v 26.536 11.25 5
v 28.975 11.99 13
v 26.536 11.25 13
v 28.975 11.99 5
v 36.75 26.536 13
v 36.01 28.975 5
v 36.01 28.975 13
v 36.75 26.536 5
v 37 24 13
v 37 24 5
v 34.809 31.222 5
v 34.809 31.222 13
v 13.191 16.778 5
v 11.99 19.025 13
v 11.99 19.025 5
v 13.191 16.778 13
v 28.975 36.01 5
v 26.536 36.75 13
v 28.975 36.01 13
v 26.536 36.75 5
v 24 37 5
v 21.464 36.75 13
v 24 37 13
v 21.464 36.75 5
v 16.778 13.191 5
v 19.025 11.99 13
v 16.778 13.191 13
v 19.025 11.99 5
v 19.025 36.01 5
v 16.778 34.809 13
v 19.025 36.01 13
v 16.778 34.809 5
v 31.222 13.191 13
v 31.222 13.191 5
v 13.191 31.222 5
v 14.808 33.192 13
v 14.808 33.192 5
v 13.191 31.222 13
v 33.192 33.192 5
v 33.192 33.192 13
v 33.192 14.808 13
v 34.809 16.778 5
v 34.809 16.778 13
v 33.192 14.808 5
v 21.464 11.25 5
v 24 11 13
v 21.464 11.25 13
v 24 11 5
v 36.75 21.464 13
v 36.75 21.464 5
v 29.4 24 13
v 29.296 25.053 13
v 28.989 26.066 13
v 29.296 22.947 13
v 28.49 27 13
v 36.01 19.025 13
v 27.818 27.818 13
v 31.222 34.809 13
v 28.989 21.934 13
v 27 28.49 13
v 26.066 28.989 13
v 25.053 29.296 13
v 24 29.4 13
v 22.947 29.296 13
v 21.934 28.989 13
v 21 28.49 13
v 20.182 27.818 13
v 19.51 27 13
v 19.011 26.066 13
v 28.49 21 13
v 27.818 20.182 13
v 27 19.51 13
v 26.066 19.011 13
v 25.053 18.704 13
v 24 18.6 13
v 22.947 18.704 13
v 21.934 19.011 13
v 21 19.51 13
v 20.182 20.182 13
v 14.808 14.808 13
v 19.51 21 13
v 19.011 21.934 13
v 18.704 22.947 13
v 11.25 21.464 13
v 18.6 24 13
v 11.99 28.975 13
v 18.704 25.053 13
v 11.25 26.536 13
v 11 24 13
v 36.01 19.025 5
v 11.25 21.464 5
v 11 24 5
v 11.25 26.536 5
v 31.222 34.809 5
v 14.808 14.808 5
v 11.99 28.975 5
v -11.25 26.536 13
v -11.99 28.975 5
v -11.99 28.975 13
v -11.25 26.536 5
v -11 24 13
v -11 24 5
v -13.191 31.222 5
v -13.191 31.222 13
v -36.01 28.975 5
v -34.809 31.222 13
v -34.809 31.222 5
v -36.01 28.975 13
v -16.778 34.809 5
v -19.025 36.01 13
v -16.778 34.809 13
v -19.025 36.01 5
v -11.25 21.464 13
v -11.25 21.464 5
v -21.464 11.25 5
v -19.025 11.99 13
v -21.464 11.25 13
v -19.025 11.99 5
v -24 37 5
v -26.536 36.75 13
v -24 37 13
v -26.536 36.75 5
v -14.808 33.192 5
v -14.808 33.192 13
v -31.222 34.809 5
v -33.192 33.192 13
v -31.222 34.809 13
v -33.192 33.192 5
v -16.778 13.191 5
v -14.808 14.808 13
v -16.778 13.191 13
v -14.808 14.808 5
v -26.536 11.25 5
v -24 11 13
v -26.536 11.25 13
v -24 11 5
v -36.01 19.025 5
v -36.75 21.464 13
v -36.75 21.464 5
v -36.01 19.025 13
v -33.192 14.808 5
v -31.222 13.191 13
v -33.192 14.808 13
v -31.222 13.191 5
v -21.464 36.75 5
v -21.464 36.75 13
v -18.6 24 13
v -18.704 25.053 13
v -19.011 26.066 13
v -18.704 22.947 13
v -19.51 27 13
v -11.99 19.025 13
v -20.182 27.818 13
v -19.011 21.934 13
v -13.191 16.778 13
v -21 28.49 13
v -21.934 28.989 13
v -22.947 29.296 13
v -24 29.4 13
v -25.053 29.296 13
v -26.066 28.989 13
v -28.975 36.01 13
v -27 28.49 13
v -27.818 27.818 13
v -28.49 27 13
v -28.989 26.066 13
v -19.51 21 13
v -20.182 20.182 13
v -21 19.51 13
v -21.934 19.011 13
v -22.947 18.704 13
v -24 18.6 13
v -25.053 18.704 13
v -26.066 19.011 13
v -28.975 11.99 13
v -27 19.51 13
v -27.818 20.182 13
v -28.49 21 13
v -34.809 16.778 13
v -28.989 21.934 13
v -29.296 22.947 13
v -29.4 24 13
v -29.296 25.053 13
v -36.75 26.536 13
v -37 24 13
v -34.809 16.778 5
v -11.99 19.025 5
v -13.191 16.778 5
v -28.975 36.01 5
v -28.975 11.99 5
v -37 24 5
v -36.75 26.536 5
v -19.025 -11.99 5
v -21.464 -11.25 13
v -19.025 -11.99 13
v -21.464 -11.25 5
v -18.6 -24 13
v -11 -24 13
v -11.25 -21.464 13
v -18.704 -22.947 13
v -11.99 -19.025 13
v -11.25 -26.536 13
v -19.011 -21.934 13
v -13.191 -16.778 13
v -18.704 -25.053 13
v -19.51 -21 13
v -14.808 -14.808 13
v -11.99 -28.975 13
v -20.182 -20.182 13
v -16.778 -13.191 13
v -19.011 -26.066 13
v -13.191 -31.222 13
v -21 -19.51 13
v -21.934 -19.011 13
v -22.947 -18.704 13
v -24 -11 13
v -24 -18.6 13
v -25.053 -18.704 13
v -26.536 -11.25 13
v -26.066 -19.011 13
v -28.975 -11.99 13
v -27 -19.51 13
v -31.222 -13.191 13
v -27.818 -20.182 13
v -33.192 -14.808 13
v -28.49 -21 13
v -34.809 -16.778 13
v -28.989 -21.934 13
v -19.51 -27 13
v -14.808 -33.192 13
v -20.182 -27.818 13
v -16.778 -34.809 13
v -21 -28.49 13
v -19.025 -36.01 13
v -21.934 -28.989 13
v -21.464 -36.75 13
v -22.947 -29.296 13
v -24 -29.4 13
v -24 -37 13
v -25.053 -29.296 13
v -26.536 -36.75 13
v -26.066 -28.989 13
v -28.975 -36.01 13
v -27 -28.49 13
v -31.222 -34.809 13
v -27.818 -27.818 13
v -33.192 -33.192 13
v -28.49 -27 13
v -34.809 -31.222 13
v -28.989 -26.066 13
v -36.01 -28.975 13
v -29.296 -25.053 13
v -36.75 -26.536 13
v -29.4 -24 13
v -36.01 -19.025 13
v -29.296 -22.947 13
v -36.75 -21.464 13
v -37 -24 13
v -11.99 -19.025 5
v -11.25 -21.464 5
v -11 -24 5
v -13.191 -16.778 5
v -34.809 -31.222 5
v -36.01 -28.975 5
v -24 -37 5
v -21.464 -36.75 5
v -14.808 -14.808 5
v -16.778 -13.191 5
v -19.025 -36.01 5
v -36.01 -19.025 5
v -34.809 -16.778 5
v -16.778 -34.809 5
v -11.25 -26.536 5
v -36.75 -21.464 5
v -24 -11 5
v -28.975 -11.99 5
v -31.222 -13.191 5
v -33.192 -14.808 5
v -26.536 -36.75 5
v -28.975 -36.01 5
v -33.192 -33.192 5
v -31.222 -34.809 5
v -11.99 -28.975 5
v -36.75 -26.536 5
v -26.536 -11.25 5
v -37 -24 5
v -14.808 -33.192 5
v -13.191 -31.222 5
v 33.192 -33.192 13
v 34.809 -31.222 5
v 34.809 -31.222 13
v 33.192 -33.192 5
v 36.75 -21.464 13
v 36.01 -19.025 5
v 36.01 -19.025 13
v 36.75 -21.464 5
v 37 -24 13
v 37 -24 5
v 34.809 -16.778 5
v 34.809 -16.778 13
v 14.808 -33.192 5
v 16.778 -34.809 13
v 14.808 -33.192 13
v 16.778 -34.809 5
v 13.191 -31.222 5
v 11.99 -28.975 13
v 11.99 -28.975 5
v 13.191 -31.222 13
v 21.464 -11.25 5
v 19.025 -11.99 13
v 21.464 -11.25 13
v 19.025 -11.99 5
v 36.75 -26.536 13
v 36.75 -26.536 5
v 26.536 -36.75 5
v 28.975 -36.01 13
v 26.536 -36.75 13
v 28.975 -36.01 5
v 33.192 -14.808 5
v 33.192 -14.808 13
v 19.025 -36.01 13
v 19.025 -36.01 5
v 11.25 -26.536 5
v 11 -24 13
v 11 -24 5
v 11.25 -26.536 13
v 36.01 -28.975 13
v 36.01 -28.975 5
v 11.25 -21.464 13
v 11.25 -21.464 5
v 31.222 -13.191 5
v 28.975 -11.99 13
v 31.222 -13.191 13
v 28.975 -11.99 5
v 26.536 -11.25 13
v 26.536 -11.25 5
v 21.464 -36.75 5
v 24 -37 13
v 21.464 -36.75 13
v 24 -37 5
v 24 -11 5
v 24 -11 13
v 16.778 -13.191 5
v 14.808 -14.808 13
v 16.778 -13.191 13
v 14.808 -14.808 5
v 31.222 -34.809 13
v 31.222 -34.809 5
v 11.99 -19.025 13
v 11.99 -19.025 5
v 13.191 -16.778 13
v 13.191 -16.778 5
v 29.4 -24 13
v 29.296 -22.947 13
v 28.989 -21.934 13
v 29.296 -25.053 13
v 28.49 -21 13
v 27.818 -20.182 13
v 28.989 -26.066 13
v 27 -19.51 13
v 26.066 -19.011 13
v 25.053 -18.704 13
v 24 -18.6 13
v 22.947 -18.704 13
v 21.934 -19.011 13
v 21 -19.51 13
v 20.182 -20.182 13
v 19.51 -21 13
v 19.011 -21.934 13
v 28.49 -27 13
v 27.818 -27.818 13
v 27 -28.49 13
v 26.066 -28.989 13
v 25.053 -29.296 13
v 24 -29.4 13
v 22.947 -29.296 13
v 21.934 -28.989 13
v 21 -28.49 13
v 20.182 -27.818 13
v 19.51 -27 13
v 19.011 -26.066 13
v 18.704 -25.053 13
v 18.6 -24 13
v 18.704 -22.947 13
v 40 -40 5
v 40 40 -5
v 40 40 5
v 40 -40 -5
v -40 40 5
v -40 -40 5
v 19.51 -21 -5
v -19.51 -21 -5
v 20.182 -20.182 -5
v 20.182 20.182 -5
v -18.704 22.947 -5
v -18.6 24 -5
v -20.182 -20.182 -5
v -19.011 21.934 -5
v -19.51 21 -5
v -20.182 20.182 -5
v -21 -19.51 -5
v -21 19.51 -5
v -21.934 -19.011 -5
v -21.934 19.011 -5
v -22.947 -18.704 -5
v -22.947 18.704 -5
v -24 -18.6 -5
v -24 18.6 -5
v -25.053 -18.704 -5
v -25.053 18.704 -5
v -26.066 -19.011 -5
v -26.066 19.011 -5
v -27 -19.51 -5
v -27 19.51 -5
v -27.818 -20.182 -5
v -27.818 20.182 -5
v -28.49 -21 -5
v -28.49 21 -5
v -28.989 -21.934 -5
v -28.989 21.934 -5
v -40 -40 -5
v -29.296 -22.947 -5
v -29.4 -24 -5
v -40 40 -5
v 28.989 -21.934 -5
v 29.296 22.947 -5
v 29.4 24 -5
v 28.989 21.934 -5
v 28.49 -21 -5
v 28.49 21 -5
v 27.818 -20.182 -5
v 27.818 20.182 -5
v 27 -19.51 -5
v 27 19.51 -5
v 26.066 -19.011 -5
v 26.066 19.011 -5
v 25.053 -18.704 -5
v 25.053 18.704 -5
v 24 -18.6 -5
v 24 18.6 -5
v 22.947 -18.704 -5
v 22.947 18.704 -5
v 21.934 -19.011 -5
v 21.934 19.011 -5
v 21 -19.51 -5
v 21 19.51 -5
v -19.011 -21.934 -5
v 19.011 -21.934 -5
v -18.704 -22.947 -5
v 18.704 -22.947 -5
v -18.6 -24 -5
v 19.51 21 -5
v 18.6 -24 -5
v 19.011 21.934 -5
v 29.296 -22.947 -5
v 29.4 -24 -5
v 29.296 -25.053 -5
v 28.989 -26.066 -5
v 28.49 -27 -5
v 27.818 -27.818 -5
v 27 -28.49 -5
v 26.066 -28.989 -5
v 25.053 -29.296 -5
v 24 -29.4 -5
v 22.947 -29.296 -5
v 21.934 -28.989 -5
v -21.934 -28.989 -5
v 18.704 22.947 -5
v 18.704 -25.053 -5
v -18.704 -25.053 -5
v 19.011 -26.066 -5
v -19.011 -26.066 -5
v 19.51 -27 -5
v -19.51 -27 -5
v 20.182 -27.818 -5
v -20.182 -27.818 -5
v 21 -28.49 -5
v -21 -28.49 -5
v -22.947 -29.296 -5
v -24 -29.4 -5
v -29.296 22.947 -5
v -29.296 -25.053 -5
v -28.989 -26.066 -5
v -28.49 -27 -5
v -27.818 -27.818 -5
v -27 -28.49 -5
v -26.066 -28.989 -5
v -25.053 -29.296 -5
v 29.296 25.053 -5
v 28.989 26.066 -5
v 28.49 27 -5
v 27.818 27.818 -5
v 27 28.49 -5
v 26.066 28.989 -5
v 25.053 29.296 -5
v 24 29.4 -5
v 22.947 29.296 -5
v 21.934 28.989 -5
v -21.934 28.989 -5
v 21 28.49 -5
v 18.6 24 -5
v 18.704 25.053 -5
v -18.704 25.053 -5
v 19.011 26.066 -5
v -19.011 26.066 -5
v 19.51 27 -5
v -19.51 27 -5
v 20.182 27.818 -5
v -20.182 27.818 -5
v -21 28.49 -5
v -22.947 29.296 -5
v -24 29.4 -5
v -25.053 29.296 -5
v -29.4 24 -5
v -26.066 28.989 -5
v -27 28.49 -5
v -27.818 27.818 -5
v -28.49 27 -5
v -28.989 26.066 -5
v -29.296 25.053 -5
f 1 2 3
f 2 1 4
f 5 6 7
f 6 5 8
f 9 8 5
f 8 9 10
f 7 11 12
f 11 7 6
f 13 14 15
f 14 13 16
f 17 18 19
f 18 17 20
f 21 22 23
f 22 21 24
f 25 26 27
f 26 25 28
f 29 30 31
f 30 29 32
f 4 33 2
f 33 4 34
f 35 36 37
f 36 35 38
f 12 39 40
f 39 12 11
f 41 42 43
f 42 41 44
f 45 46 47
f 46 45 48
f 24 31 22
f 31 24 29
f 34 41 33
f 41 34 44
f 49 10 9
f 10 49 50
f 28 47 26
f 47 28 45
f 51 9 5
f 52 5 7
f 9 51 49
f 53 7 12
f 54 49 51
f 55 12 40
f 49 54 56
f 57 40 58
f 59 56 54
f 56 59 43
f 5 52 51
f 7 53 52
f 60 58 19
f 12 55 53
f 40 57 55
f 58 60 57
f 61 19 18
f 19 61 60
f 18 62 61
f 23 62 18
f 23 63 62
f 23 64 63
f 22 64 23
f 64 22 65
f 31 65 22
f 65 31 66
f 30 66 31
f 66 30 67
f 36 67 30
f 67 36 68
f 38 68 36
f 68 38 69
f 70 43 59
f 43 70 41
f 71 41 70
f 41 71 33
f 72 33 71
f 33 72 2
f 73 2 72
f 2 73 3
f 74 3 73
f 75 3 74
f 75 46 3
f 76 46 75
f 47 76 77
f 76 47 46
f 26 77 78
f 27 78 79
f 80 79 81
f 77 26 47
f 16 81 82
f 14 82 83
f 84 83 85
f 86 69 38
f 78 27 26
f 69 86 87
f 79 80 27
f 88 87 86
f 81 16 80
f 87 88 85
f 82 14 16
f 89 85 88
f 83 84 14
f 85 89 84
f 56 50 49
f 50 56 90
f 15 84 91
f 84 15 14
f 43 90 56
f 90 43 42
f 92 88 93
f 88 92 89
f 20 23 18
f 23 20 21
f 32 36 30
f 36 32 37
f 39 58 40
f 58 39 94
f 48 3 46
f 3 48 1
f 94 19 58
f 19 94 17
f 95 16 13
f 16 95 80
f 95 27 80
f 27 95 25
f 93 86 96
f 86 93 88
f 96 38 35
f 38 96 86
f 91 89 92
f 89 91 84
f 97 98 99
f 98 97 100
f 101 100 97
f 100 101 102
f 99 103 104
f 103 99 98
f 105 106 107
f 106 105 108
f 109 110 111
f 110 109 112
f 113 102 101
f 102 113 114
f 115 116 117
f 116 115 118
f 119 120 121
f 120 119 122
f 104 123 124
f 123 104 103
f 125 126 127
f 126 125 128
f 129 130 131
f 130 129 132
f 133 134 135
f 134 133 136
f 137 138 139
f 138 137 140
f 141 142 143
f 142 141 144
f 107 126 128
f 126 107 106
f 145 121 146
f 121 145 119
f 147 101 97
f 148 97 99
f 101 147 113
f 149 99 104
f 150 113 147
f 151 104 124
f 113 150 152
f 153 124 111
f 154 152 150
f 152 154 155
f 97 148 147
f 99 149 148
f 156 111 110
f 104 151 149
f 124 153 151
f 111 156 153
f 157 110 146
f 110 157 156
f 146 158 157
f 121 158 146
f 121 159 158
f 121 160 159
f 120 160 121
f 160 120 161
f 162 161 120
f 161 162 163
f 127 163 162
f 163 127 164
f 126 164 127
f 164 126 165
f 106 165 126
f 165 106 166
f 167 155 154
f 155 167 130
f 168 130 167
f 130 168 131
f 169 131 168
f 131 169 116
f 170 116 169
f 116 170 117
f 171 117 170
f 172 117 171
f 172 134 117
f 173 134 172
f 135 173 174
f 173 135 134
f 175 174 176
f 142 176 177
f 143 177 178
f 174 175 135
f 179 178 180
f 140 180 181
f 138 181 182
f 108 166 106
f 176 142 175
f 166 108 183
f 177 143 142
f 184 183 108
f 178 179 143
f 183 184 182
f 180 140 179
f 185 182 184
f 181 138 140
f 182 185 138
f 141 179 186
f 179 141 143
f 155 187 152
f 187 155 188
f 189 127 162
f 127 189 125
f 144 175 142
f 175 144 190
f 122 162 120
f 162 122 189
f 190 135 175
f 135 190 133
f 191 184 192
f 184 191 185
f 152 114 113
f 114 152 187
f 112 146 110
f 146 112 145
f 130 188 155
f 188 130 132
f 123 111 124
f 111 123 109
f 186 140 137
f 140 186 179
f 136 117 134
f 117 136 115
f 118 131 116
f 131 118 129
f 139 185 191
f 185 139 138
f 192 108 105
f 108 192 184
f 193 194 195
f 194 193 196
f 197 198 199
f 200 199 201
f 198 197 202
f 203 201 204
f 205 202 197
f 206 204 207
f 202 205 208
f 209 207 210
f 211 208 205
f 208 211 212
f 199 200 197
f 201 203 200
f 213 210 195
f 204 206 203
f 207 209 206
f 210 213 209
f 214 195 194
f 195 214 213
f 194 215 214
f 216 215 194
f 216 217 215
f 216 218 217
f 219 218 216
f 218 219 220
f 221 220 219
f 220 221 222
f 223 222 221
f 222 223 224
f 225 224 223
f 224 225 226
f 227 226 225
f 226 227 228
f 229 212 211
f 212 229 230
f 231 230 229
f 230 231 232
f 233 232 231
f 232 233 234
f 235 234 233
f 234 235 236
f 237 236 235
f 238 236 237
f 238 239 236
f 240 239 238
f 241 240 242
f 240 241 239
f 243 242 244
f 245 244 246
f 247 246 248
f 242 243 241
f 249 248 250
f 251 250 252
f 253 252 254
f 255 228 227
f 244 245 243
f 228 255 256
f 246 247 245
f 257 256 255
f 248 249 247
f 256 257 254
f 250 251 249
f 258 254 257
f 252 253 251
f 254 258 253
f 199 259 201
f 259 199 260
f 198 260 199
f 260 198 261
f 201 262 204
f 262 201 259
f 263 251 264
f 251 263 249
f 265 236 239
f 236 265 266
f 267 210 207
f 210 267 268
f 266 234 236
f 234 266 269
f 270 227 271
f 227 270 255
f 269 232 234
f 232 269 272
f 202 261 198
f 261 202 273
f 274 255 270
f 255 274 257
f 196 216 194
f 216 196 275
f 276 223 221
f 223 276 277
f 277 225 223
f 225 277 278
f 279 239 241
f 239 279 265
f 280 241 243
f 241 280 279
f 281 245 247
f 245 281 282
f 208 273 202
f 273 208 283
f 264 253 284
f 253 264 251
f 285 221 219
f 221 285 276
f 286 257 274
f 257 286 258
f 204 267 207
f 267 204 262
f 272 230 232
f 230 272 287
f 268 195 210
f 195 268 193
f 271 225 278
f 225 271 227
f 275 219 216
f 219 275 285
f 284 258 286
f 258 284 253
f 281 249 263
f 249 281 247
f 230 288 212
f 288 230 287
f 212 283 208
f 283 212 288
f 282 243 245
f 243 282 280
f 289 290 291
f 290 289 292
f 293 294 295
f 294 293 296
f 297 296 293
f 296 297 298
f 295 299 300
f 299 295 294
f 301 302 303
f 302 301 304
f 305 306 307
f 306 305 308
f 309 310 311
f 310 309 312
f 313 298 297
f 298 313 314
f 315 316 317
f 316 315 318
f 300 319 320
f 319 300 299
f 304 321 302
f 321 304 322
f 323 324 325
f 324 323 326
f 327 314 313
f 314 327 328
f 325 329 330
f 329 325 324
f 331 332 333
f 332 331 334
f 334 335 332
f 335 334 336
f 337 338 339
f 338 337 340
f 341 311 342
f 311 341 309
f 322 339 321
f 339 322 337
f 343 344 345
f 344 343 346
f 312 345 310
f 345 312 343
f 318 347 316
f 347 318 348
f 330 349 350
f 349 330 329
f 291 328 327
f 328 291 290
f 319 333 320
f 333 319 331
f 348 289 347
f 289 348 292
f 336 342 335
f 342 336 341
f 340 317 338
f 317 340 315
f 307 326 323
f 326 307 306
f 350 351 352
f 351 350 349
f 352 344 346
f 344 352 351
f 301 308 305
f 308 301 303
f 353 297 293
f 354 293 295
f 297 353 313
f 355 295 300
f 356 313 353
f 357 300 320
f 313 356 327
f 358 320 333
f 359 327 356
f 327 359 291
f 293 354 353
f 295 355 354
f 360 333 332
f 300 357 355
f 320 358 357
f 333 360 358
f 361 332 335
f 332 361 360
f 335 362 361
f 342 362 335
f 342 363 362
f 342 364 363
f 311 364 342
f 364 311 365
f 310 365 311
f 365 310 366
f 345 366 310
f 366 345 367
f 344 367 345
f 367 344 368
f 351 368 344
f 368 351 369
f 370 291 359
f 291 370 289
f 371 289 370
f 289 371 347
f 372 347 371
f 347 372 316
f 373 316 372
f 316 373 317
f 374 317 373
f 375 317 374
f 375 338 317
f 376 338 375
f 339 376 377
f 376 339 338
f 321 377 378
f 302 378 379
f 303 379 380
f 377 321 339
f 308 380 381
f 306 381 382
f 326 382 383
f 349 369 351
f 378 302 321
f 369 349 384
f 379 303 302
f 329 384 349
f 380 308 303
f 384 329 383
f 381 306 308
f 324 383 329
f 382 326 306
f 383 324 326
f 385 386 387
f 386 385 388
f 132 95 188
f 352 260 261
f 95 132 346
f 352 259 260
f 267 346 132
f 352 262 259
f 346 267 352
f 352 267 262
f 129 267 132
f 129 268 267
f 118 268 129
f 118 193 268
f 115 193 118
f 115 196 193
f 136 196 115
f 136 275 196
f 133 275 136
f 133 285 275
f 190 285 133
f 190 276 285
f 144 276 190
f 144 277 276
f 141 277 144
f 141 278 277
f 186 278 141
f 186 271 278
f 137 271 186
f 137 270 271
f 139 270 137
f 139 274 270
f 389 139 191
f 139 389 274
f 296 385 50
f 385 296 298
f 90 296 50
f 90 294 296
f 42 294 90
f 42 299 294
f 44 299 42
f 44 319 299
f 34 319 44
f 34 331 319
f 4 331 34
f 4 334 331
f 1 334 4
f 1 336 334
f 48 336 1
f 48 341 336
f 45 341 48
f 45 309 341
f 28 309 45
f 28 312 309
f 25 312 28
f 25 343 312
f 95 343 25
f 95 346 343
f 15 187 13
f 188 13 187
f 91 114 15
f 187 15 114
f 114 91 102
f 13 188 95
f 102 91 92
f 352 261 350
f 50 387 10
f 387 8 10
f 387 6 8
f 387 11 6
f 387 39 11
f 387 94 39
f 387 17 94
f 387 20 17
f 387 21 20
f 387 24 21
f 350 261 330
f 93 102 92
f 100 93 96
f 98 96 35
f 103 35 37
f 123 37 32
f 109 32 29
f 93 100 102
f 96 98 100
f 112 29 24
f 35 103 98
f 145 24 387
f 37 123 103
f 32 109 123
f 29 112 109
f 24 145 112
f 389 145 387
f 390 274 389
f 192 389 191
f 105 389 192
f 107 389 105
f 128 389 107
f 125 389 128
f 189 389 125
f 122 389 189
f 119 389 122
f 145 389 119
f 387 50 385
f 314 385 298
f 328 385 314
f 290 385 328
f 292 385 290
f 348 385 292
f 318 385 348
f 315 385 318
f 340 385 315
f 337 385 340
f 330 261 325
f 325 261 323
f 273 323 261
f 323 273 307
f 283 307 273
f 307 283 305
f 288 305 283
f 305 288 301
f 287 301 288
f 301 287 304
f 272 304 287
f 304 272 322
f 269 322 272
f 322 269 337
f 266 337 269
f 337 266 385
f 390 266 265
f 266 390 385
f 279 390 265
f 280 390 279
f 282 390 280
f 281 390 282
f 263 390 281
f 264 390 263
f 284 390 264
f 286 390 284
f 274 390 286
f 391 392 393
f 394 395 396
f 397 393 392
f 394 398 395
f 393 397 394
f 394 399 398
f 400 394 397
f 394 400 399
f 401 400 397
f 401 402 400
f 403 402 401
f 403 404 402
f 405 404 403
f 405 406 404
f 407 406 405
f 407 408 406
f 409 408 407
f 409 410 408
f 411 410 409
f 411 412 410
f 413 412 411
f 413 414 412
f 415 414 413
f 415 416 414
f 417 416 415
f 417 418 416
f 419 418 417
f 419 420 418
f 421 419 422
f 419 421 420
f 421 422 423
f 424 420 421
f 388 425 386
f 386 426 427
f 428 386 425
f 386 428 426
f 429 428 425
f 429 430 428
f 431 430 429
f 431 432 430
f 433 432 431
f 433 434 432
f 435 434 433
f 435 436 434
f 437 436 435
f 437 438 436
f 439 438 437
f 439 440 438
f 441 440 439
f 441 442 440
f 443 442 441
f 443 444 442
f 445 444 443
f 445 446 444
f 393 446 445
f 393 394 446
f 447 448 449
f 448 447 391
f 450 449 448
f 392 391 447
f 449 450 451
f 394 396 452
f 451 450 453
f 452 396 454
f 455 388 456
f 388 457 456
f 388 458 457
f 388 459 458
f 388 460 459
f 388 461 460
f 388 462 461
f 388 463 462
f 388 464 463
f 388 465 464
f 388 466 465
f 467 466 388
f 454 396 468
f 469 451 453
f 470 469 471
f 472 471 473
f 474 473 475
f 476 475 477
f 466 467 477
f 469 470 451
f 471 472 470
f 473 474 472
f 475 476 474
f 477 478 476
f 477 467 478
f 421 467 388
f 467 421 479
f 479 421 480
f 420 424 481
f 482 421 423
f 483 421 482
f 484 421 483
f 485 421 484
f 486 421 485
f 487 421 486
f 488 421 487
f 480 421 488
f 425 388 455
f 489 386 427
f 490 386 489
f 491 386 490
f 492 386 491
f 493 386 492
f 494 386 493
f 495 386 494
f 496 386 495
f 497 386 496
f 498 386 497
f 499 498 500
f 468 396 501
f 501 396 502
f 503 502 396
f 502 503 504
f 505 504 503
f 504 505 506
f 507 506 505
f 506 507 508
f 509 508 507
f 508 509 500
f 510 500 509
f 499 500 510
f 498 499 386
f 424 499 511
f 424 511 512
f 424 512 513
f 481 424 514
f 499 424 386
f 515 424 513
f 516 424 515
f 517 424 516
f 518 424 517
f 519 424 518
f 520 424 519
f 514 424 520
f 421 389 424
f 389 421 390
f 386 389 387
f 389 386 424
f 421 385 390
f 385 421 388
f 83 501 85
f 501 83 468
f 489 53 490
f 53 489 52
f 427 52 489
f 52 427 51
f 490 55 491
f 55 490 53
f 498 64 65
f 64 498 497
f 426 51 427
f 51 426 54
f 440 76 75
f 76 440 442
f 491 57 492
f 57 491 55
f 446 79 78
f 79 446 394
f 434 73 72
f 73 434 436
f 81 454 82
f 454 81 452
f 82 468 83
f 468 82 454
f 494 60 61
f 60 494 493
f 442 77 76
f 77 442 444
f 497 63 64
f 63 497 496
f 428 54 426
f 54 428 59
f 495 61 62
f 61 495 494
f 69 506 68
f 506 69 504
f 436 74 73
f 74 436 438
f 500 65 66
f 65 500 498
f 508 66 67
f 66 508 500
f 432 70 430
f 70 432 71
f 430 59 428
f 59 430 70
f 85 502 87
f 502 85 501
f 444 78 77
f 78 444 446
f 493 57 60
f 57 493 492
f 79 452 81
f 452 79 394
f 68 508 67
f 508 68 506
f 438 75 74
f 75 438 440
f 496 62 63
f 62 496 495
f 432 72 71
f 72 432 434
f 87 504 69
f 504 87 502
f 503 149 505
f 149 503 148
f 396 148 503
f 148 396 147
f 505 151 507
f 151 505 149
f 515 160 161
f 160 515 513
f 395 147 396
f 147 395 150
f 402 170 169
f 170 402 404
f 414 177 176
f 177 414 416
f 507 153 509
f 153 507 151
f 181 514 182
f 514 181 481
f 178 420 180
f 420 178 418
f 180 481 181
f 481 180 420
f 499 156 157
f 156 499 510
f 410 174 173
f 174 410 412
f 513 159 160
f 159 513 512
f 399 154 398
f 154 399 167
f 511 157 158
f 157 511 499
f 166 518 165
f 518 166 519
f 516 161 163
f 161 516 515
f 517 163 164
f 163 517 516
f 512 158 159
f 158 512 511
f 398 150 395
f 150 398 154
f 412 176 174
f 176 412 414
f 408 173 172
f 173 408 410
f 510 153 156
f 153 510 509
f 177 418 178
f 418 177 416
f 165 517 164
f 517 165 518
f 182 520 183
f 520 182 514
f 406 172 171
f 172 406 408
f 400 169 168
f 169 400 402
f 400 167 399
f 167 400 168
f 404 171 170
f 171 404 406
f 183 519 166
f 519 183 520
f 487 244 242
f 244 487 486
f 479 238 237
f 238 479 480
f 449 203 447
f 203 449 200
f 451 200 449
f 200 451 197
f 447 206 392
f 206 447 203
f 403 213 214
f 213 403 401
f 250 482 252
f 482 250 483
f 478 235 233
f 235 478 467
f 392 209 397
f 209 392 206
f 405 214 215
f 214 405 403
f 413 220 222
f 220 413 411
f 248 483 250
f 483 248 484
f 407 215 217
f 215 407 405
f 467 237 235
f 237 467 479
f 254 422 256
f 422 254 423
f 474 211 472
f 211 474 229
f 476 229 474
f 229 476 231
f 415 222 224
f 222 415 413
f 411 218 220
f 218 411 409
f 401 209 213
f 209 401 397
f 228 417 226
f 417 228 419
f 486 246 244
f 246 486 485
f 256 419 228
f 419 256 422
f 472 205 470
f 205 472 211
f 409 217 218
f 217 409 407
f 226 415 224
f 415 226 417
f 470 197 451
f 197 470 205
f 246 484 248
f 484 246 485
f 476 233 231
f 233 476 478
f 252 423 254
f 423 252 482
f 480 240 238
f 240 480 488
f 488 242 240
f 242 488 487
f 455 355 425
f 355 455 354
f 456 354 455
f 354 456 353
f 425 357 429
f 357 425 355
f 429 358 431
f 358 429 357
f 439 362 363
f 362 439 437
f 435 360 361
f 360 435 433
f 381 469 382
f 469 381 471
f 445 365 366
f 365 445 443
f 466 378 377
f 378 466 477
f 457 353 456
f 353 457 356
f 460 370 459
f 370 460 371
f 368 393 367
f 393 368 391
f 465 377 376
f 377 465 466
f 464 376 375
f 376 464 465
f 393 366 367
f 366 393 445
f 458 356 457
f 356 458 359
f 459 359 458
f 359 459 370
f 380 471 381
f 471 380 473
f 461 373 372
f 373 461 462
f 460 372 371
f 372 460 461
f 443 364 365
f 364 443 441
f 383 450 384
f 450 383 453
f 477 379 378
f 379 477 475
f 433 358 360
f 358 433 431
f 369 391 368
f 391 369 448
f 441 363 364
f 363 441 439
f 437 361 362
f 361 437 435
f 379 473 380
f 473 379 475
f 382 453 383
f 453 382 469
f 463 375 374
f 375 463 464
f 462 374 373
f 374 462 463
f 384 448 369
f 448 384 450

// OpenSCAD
$fn = 32;

// ----------------------------------------------------------------------
// Anchor pads 80 x 80 x 18
// four corner bosses with anchor holes
// ----------------------------------------------------------------------

// --- parameters (mm) ---
plate = [80, 80, 10];   // base plate size (x, y, z)
pads = 4;               // boss count, one per corner
edge = 16;              // boss centre offset from the plate edge
boss_d = 26;            // boss diameter
boss_h = 8;             // boss height above the base plate
bore_d = 10.5;          // nominal hole diameter from the drawing
print_allowance = 0.3;  // clearance added for printing

// --- derived feature positions (mm) ---
hole_d = bore_d + print_allowance;  // = 10.8   hole diameter as printed
height = plate[2] + boss_h;         // = 18   overall height of the part
corner_x = plate[0] / 2 - edge;     // = 24   boss centre X
corner_y = plate[1] / 2 - edge;     // = 24   boss centre Y
feature_centers = [
  [corner_x, corner_y],
  [-corner_x, corner_y],
  [-corner_x, -corner_y],
  [corner_x, -corner_y]
];   // boss centres, anchor holes are drilled there

// base plate, four bosses standing on it, anchor holes all the way through
difference() {
  union() {
    cube(plate, center = true);
    for (centre = feature_centers)
      translate([centre[0], centre[1], plate[2] / 2 - 1])
        cylinder(d = boss_d, h = boss_h + 1);
  }
  for (centre = feature_centers)
    translate([centre[0], centre[1], -height])
      cylinder(d = hole_d, h = 2 * height + 2);  // through boss and plate
}
